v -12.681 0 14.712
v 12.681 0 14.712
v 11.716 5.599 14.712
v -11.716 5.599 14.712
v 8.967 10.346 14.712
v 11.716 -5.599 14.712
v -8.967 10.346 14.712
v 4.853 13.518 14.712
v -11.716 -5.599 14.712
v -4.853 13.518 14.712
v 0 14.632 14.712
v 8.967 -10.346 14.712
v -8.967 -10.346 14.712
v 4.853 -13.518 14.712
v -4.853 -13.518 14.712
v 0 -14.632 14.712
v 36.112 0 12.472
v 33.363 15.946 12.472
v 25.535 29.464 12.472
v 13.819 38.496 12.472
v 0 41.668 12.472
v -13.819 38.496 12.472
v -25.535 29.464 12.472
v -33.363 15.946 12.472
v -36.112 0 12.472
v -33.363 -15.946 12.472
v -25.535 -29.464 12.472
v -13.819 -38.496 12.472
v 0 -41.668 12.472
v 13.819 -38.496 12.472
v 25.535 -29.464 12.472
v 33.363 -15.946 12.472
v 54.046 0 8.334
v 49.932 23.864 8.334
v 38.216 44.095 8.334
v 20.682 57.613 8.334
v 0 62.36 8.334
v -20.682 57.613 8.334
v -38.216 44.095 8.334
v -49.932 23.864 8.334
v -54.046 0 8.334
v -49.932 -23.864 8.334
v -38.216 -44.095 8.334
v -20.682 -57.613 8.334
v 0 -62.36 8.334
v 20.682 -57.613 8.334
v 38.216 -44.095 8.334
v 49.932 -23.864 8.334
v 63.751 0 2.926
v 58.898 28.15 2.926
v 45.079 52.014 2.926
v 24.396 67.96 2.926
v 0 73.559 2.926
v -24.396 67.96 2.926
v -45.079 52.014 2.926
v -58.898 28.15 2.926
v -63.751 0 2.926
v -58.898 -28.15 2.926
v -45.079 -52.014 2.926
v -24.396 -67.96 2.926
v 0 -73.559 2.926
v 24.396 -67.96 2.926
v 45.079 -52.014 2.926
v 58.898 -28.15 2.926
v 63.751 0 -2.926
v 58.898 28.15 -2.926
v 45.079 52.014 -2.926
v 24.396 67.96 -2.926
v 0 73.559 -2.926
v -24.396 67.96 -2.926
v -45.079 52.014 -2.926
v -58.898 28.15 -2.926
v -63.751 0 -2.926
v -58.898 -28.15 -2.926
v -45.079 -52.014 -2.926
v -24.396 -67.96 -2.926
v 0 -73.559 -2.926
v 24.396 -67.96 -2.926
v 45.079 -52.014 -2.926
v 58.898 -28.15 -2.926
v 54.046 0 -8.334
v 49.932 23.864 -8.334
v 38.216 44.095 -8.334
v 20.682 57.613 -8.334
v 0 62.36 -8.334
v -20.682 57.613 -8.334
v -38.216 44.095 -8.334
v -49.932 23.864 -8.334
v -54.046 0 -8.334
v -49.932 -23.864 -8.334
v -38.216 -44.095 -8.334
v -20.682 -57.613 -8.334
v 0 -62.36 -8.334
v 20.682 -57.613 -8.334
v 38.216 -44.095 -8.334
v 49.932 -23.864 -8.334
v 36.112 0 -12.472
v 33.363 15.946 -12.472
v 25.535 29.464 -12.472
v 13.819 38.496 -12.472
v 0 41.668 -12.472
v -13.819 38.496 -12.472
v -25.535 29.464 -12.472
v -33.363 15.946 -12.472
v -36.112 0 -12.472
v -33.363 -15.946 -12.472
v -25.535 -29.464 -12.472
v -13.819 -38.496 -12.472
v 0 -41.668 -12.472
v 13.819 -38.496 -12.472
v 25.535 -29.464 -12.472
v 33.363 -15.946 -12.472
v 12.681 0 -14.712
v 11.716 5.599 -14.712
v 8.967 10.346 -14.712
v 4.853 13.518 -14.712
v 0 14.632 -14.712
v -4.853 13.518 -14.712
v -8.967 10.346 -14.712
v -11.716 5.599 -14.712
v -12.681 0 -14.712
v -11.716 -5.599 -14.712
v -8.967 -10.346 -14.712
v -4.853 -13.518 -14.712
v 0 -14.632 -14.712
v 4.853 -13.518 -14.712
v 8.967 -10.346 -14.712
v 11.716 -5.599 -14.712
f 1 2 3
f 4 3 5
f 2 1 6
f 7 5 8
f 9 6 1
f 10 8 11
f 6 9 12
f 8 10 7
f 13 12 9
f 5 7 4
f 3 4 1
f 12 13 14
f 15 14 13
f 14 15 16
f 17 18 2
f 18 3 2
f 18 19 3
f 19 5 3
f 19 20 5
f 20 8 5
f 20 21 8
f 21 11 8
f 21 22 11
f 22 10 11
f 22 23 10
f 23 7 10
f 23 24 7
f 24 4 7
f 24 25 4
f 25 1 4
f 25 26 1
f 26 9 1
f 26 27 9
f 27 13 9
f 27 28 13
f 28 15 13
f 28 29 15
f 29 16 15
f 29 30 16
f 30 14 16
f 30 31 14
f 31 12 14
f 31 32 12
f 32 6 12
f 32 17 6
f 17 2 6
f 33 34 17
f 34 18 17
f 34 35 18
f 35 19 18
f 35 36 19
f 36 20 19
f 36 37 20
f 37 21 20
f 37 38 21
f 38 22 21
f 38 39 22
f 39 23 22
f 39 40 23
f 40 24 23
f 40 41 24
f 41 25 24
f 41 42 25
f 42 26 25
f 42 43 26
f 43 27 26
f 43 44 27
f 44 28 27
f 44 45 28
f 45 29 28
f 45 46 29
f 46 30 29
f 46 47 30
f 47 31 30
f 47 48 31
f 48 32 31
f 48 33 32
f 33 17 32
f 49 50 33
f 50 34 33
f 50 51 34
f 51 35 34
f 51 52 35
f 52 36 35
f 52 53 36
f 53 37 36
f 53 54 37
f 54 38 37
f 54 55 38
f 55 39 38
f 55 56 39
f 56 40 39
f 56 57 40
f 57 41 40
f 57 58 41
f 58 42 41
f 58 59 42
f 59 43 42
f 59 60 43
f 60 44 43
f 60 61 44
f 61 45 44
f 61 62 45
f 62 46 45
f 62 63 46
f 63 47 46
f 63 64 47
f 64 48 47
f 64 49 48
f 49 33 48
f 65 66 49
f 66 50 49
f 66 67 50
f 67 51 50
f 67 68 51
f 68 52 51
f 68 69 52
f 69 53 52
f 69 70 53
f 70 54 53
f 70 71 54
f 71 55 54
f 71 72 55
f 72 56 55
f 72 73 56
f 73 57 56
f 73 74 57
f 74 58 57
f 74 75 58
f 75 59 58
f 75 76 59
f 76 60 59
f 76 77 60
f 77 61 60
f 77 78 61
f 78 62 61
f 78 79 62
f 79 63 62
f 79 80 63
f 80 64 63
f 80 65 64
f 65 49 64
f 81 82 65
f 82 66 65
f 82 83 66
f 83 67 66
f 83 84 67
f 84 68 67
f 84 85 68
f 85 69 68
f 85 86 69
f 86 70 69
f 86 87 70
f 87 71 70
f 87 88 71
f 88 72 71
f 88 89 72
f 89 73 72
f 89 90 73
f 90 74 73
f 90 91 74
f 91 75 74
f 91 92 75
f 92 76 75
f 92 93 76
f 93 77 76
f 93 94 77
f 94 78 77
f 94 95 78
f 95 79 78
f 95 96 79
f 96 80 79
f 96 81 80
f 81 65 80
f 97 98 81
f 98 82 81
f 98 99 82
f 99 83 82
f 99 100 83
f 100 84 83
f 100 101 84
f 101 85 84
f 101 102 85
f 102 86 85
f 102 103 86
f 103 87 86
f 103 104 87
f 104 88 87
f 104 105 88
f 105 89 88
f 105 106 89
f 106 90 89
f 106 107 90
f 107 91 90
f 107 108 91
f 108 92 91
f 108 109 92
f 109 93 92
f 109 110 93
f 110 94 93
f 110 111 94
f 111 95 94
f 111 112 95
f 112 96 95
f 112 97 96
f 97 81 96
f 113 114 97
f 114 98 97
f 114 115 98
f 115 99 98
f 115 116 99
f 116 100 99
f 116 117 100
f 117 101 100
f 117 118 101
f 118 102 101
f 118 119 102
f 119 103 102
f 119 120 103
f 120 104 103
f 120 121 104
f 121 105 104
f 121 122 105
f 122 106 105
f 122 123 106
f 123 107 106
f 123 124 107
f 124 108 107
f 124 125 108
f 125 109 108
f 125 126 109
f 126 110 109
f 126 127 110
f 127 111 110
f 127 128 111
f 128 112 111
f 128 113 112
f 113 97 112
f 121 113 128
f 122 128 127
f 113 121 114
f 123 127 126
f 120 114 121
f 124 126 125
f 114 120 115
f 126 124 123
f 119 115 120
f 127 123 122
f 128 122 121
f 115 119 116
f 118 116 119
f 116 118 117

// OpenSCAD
// Generated by SolidPython 1.0.1 on 2020-07-29 00:46:51


scale(v = [13, 15, 3]) {
	sphere(r = 5);
}
/***********************************************
*********      SolidPython code:      **********
************************************************
 
# import packages: SolidPython
from solid import *
from solid.utils import *
from itertools import chain, combinations, permutations


class Resize:

    def __init__(self, scad_file):
        self.scad_file = scad_file
        #self.scad_file = import_scad(scad_file)
        # cone/cylinder param:
        self.r1 = 0
        self.r2 = 0
        self.h = 0
        # rectangular prism param:
        self.w = 0
        self.l = 0
        # ellipse param:
        self.r = 0

    # import OpenScad code (file name corresponds to shape)


    # classify shape + parameters
    def assign(self, param1, param2, param3):
        if self.scad_file == 'cone.scad':
            self.r1 = param1
            self.r2 = param2
            self.h = param3
        elif self.scad_file == 'cylinder.scad':
            self.r1 = param1
            self.r2 = param2
            self.h = param3
        elif self.scad_file == 'rectangularPrism.scad':
            self.h = param1
            self.l = param2
            self.w = param3
        else:
            self.r = param1
            self.h = param2

    # resize parameters
    def iterate(self):
        x = range(3, 20, 2)
        i = 1
        if self.scad_file == 'cone.scad':
            tempList = list(permutations(x, 2))
            for temp in tempList:
                param1 = temp[0]
                param2 = temp[1]
                filepath = 'produced_scad_files/' + 'cone' + str(param1) + '_' + str(param2) + '_' + '.scad'
                scad_render_to_file(cylinder(h=param1, r1=param2, r2=0), filepath)

        elif self.scad_file == 'cylinder.scad':
            tempList = list(permutations(x, 3))
            for temp in tempList:
                param1 = temp[0]
                param2 = temp[1]
                filepath = 'produced_scad_files/' + 'cylinder' + str(param1) + '_' + str(param2) + '_' + '.scad'
                scad_render_to_file(cylinder(h=param1, r1=param2, r2=param2), filepath)

        elif self.scad_file == 'rectangularPrism.scad':
            tempList = list(permutations(x, 3))
            for temp in tempList:
                param1 = temp[0]
                param2 = temp[1]
                param3 = temp[2]
                filepath = 'produced_scad_files/' + 'rectangularPrism' + str(param1) + '_' + str(param2) + '_' + str(
                    param3) + '.scad'
                scad_render_to_file(cube(size=(param1, param2, param3)), filepath)

        elif self.scad_file == 'ellipse.scad':
            tempList = list(permutations(x, 4))
            for temp in tempList:
                param1 = temp[0]
                param2 = temp[1]
                param3 = temp[2]
                param4 = temp[3]
                filepath = 'produced_scad_files/' + 'ellipse' + str(param1) + '_' + str(param2) + '_' + str(param3) + '_' + str(param4) + '.scad'
                scad_render_to_file(scale([param1, param2, param3])(sphere(r=param4)), filepath)

    def render_to_scadfile(self):
        scad_render_to_file(scad, 'example.scad') 
 
************************************************/
